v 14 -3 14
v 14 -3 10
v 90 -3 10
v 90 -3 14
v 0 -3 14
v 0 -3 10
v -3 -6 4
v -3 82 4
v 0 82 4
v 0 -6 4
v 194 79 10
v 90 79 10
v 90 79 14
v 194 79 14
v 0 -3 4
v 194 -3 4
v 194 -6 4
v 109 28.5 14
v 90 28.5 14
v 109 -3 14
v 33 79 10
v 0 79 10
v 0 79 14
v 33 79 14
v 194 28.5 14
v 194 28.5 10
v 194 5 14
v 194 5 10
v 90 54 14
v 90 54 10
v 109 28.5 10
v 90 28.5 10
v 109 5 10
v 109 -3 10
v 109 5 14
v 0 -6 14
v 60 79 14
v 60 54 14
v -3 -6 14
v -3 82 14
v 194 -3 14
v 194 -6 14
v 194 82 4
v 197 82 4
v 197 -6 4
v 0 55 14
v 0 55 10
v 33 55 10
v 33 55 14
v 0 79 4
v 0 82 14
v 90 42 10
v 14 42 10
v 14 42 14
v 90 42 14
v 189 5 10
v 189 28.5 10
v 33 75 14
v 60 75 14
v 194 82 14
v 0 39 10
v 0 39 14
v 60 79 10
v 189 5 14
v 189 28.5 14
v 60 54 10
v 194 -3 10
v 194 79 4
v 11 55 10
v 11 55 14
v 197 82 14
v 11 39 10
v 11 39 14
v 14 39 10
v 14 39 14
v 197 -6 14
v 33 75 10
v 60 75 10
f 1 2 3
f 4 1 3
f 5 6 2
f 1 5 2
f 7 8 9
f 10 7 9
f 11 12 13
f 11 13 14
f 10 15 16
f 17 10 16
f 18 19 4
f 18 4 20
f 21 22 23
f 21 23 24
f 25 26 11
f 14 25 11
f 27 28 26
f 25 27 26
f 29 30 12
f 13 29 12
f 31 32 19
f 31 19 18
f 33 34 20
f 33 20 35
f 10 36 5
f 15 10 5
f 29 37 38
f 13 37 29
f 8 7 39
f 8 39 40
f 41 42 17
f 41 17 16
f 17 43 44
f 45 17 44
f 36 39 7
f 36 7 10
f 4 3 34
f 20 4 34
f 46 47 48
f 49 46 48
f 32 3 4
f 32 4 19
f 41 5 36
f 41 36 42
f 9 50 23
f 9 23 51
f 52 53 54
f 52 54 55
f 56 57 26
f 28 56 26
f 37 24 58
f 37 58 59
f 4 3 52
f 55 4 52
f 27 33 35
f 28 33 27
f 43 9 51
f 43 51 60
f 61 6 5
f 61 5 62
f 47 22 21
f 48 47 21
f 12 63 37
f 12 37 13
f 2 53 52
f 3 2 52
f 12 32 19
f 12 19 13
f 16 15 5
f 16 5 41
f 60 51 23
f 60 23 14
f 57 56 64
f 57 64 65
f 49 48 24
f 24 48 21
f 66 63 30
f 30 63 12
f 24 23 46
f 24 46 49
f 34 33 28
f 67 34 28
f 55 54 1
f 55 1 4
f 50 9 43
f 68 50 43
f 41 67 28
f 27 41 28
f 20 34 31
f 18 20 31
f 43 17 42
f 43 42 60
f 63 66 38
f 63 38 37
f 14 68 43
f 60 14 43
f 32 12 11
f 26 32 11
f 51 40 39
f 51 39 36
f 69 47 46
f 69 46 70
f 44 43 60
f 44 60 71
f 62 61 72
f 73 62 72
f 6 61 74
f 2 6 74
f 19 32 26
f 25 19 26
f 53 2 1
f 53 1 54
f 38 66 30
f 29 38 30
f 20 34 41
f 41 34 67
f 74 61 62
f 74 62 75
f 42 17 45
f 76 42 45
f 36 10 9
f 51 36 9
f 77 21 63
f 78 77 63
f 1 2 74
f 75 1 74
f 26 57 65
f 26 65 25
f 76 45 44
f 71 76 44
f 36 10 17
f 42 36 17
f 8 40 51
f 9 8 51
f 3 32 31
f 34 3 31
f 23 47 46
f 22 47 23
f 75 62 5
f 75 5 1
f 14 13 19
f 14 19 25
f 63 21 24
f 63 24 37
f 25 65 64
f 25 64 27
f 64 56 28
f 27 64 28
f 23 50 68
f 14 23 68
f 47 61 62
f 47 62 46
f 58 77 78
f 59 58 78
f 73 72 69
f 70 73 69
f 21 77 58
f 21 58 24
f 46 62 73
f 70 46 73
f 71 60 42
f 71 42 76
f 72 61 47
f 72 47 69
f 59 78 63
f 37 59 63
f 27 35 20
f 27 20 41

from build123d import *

# Parameters (mm, degrees)
BOX001_W     = 85
BOX001_H     = 8
BOX001_DEPTH = 4
BOX002_W     = 5
BOX002_H     = 23.5
BOX002_DEPTH = 4
BOX003_W     = 104
BOX003_H     = 50.5
BOX003_DEPTH = 4
BOX004_W     = 19
BOX004_H     = 31.5
BOX004_DEPTH = 4
BOX005_W     = 76
BOX005_H     = 45
BOX005_DEPTH = 4
BOX006_W     = 30
BOX006_H     = 25
BOX006_DEPTH = 4
BOX007_W     = 14
BOX007_H     = 42
BOX007_DEPTH = 4
BOX008_W     = 33
BOX008_H     = 24
BOX008_DEPTH = 4
BOX009_W     = 11
BOX009_H     = 16
BOX009_DEPTH = 4
BOX_W        = 194
BOX_H        = 3
BOX_DEPTH    = 10
BOX011_W     = 3
BOX011_H     = 88
BOX011_DEPTH = 10
BOX012_W     = 3
BOX012_H     = 88
BOX012_DEPTH = 10
BOX013_W     = 27
BOX013_H     = 4
BOX013_DEPTH = 4
BOX010_W     = 194
BOX010_H     = 3
BOX010_DEPTH = 10


with BuildPart() as box001:
    # Box001 → Box001 (new body)
    with BuildSketch(Plane(origin=(109, -3, 10), x_dir=(1, 0, 0), z_dir=(0, 0, 1))):
        with Locations((42.5, 4)):
            Rectangle(BOX001_W, BOX001_H)
    extrude(amount=BOX001_DEPTH)


with BuildPart() as box002:
    # Box002 → Box002 (new body)
    with BuildSketch(Plane(origin=(189, 5, 10), x_dir=(1, 0, 0), z_dir=(0, 0, 1))):
        with Locations((2.5, 11.75)):
            Rectangle(BOX002_W, BOX002_H)
    extrude(amount=BOX002_DEPTH)


with BuildPart() as box003:
    # Box003 → Box003 (new body)
    with BuildSketch(Plane(origin=(90, 28.5, 10), x_dir=(1, 0, 0), z_dir=(0, 0, 1))):
        with Locations((52, 25.25)):
            Rectangle(BOX003_W, BOX003_H)
    extrude(amount=BOX003_DEPTH)


with BuildPart() as box004:
    # Box004 → Box004 (new body)
    with BuildSketch(Plane(origin=(90, -3, 10), x_dir=(1, 0, 0), z_dir=(0, 0, 1))):
        with Locations((9.5, 15.75)):
            Rectangle(BOX004_W, BOX004_H)
    extrude(amount=BOX004_DEPTH)


with BuildPart() as box005:
    # Box005 → Box005 (new body)
    with BuildSketch(Plane(origin=(14, -3, 10), x_dir=(1, 0, 0), z_dir=(0, 0, 1))):
        with Locations((38, 22.5)):
            Rectangle(BOX005_W, BOX005_H)
    extrude(amount=BOX005_DEPTH)


with BuildPart() as box006:
    # Box006 → Box006 (new body)
    with BuildSketch(Plane(origin=(60, 54, 10), x_dir=(1, 0, 0), z_dir=(0, 0, 1))):
        with Locations((15, 12.5)):
            Rectangle(BOX006_W, BOX006_H)
    extrude(amount=BOX006_DEPTH)


with BuildPart() as box007:
    # Box007 → Box007 (new body)
    with BuildSketch(Plane(origin=(0, -3, 10), x_dir=(1, 0, 0), z_dir=(0, 0, 1))):
        with Locations((7, 21)):
            Rectangle(BOX007_W, BOX007_H)
    extrude(amount=BOX007_DEPTH)


with BuildPart() as box008:
    # Box008 → Box008 (new body)
    with BuildSketch(Plane(origin=(0, 55, 10), x_dir=(1, 0, 0), z_dir=(0, 0, 1))):
        with Locations((16.5, 12)):
            Rectangle(BOX008_W, BOX008_H)
    extrude(amount=BOX008_DEPTH)


with BuildPart() as box009:
    # Box009 → Box009 (new body)
    with BuildSketch(Plane(origin=(0, 39, 10), x_dir=(1, 0, 0), z_dir=(0, 0, 1))):
        with Locations((5.5, 8)):
            Rectangle(BOX009_W, BOX009_H)
    extrude(amount=BOX009_DEPTH)


with BuildPart() as box:
    # Box → Box (new body)
    with BuildSketch(Plane(origin=(0, 79, 4), x_dir=(1, 0, 0), z_dir=(0, 0, 1))):
        with Locations((97, 1.5)):
            Rectangle(BOX_W, BOX_H)
    extrude(amount=BOX_DEPTH)


with BuildPart() as box011:
    # Box011 → Box011 (new body)
    with BuildSketch(Plane(origin=(194, -6, 4), x_dir=(1, 0, 0), z_dir=(0, 0, 1))):
        with Locations((1.5, 44)):
            Rectangle(BOX011_W, BOX011_H)
    extrude(amount=BOX011_DEPTH)


with BuildPart() as box012:
    # Box012 → Box012 (new body)
    with BuildSketch(Plane(origin=(-3, -6, 4), x_dir=(1, 0, 0), z_dir=(0, 0, 1))):
        with Locations((1.5, 44)):
            Rectangle(BOX012_W, BOX012_H)
    extrude(amount=BOX012_DEPTH)


with BuildPart() as box013:
    # Box013 → Box013 (new body)
    with BuildSketch(Plane(origin=(33, 75, 10), x_dir=(1, 0, 0), z_dir=(0, 0, 1))):
        with Locations((13.5, 2)):
            Rectangle(BOX013_W, BOX013_H)
    extrude(amount=BOX013_DEPTH)


with BuildPart() as box010:
    # Box010 → Box010 (new body)
    with BuildSketch(Plane(origin=(0, -6, 4), x_dir=(1, 0, 0), z_dir=(0, 0, 1))):
        with Locations((97, 1.5)):
            Rectangle(BOX010_W, BOX010_H)
    extrude(amount=BOX010_DEPTH)


solid = Compound([box001.part, box002.part, box003.part, box004.part, box005.part, box006.part, box007.part, box008.part, box009.part, box.part, box011.part, box012.part, box013.part, box010.part])
